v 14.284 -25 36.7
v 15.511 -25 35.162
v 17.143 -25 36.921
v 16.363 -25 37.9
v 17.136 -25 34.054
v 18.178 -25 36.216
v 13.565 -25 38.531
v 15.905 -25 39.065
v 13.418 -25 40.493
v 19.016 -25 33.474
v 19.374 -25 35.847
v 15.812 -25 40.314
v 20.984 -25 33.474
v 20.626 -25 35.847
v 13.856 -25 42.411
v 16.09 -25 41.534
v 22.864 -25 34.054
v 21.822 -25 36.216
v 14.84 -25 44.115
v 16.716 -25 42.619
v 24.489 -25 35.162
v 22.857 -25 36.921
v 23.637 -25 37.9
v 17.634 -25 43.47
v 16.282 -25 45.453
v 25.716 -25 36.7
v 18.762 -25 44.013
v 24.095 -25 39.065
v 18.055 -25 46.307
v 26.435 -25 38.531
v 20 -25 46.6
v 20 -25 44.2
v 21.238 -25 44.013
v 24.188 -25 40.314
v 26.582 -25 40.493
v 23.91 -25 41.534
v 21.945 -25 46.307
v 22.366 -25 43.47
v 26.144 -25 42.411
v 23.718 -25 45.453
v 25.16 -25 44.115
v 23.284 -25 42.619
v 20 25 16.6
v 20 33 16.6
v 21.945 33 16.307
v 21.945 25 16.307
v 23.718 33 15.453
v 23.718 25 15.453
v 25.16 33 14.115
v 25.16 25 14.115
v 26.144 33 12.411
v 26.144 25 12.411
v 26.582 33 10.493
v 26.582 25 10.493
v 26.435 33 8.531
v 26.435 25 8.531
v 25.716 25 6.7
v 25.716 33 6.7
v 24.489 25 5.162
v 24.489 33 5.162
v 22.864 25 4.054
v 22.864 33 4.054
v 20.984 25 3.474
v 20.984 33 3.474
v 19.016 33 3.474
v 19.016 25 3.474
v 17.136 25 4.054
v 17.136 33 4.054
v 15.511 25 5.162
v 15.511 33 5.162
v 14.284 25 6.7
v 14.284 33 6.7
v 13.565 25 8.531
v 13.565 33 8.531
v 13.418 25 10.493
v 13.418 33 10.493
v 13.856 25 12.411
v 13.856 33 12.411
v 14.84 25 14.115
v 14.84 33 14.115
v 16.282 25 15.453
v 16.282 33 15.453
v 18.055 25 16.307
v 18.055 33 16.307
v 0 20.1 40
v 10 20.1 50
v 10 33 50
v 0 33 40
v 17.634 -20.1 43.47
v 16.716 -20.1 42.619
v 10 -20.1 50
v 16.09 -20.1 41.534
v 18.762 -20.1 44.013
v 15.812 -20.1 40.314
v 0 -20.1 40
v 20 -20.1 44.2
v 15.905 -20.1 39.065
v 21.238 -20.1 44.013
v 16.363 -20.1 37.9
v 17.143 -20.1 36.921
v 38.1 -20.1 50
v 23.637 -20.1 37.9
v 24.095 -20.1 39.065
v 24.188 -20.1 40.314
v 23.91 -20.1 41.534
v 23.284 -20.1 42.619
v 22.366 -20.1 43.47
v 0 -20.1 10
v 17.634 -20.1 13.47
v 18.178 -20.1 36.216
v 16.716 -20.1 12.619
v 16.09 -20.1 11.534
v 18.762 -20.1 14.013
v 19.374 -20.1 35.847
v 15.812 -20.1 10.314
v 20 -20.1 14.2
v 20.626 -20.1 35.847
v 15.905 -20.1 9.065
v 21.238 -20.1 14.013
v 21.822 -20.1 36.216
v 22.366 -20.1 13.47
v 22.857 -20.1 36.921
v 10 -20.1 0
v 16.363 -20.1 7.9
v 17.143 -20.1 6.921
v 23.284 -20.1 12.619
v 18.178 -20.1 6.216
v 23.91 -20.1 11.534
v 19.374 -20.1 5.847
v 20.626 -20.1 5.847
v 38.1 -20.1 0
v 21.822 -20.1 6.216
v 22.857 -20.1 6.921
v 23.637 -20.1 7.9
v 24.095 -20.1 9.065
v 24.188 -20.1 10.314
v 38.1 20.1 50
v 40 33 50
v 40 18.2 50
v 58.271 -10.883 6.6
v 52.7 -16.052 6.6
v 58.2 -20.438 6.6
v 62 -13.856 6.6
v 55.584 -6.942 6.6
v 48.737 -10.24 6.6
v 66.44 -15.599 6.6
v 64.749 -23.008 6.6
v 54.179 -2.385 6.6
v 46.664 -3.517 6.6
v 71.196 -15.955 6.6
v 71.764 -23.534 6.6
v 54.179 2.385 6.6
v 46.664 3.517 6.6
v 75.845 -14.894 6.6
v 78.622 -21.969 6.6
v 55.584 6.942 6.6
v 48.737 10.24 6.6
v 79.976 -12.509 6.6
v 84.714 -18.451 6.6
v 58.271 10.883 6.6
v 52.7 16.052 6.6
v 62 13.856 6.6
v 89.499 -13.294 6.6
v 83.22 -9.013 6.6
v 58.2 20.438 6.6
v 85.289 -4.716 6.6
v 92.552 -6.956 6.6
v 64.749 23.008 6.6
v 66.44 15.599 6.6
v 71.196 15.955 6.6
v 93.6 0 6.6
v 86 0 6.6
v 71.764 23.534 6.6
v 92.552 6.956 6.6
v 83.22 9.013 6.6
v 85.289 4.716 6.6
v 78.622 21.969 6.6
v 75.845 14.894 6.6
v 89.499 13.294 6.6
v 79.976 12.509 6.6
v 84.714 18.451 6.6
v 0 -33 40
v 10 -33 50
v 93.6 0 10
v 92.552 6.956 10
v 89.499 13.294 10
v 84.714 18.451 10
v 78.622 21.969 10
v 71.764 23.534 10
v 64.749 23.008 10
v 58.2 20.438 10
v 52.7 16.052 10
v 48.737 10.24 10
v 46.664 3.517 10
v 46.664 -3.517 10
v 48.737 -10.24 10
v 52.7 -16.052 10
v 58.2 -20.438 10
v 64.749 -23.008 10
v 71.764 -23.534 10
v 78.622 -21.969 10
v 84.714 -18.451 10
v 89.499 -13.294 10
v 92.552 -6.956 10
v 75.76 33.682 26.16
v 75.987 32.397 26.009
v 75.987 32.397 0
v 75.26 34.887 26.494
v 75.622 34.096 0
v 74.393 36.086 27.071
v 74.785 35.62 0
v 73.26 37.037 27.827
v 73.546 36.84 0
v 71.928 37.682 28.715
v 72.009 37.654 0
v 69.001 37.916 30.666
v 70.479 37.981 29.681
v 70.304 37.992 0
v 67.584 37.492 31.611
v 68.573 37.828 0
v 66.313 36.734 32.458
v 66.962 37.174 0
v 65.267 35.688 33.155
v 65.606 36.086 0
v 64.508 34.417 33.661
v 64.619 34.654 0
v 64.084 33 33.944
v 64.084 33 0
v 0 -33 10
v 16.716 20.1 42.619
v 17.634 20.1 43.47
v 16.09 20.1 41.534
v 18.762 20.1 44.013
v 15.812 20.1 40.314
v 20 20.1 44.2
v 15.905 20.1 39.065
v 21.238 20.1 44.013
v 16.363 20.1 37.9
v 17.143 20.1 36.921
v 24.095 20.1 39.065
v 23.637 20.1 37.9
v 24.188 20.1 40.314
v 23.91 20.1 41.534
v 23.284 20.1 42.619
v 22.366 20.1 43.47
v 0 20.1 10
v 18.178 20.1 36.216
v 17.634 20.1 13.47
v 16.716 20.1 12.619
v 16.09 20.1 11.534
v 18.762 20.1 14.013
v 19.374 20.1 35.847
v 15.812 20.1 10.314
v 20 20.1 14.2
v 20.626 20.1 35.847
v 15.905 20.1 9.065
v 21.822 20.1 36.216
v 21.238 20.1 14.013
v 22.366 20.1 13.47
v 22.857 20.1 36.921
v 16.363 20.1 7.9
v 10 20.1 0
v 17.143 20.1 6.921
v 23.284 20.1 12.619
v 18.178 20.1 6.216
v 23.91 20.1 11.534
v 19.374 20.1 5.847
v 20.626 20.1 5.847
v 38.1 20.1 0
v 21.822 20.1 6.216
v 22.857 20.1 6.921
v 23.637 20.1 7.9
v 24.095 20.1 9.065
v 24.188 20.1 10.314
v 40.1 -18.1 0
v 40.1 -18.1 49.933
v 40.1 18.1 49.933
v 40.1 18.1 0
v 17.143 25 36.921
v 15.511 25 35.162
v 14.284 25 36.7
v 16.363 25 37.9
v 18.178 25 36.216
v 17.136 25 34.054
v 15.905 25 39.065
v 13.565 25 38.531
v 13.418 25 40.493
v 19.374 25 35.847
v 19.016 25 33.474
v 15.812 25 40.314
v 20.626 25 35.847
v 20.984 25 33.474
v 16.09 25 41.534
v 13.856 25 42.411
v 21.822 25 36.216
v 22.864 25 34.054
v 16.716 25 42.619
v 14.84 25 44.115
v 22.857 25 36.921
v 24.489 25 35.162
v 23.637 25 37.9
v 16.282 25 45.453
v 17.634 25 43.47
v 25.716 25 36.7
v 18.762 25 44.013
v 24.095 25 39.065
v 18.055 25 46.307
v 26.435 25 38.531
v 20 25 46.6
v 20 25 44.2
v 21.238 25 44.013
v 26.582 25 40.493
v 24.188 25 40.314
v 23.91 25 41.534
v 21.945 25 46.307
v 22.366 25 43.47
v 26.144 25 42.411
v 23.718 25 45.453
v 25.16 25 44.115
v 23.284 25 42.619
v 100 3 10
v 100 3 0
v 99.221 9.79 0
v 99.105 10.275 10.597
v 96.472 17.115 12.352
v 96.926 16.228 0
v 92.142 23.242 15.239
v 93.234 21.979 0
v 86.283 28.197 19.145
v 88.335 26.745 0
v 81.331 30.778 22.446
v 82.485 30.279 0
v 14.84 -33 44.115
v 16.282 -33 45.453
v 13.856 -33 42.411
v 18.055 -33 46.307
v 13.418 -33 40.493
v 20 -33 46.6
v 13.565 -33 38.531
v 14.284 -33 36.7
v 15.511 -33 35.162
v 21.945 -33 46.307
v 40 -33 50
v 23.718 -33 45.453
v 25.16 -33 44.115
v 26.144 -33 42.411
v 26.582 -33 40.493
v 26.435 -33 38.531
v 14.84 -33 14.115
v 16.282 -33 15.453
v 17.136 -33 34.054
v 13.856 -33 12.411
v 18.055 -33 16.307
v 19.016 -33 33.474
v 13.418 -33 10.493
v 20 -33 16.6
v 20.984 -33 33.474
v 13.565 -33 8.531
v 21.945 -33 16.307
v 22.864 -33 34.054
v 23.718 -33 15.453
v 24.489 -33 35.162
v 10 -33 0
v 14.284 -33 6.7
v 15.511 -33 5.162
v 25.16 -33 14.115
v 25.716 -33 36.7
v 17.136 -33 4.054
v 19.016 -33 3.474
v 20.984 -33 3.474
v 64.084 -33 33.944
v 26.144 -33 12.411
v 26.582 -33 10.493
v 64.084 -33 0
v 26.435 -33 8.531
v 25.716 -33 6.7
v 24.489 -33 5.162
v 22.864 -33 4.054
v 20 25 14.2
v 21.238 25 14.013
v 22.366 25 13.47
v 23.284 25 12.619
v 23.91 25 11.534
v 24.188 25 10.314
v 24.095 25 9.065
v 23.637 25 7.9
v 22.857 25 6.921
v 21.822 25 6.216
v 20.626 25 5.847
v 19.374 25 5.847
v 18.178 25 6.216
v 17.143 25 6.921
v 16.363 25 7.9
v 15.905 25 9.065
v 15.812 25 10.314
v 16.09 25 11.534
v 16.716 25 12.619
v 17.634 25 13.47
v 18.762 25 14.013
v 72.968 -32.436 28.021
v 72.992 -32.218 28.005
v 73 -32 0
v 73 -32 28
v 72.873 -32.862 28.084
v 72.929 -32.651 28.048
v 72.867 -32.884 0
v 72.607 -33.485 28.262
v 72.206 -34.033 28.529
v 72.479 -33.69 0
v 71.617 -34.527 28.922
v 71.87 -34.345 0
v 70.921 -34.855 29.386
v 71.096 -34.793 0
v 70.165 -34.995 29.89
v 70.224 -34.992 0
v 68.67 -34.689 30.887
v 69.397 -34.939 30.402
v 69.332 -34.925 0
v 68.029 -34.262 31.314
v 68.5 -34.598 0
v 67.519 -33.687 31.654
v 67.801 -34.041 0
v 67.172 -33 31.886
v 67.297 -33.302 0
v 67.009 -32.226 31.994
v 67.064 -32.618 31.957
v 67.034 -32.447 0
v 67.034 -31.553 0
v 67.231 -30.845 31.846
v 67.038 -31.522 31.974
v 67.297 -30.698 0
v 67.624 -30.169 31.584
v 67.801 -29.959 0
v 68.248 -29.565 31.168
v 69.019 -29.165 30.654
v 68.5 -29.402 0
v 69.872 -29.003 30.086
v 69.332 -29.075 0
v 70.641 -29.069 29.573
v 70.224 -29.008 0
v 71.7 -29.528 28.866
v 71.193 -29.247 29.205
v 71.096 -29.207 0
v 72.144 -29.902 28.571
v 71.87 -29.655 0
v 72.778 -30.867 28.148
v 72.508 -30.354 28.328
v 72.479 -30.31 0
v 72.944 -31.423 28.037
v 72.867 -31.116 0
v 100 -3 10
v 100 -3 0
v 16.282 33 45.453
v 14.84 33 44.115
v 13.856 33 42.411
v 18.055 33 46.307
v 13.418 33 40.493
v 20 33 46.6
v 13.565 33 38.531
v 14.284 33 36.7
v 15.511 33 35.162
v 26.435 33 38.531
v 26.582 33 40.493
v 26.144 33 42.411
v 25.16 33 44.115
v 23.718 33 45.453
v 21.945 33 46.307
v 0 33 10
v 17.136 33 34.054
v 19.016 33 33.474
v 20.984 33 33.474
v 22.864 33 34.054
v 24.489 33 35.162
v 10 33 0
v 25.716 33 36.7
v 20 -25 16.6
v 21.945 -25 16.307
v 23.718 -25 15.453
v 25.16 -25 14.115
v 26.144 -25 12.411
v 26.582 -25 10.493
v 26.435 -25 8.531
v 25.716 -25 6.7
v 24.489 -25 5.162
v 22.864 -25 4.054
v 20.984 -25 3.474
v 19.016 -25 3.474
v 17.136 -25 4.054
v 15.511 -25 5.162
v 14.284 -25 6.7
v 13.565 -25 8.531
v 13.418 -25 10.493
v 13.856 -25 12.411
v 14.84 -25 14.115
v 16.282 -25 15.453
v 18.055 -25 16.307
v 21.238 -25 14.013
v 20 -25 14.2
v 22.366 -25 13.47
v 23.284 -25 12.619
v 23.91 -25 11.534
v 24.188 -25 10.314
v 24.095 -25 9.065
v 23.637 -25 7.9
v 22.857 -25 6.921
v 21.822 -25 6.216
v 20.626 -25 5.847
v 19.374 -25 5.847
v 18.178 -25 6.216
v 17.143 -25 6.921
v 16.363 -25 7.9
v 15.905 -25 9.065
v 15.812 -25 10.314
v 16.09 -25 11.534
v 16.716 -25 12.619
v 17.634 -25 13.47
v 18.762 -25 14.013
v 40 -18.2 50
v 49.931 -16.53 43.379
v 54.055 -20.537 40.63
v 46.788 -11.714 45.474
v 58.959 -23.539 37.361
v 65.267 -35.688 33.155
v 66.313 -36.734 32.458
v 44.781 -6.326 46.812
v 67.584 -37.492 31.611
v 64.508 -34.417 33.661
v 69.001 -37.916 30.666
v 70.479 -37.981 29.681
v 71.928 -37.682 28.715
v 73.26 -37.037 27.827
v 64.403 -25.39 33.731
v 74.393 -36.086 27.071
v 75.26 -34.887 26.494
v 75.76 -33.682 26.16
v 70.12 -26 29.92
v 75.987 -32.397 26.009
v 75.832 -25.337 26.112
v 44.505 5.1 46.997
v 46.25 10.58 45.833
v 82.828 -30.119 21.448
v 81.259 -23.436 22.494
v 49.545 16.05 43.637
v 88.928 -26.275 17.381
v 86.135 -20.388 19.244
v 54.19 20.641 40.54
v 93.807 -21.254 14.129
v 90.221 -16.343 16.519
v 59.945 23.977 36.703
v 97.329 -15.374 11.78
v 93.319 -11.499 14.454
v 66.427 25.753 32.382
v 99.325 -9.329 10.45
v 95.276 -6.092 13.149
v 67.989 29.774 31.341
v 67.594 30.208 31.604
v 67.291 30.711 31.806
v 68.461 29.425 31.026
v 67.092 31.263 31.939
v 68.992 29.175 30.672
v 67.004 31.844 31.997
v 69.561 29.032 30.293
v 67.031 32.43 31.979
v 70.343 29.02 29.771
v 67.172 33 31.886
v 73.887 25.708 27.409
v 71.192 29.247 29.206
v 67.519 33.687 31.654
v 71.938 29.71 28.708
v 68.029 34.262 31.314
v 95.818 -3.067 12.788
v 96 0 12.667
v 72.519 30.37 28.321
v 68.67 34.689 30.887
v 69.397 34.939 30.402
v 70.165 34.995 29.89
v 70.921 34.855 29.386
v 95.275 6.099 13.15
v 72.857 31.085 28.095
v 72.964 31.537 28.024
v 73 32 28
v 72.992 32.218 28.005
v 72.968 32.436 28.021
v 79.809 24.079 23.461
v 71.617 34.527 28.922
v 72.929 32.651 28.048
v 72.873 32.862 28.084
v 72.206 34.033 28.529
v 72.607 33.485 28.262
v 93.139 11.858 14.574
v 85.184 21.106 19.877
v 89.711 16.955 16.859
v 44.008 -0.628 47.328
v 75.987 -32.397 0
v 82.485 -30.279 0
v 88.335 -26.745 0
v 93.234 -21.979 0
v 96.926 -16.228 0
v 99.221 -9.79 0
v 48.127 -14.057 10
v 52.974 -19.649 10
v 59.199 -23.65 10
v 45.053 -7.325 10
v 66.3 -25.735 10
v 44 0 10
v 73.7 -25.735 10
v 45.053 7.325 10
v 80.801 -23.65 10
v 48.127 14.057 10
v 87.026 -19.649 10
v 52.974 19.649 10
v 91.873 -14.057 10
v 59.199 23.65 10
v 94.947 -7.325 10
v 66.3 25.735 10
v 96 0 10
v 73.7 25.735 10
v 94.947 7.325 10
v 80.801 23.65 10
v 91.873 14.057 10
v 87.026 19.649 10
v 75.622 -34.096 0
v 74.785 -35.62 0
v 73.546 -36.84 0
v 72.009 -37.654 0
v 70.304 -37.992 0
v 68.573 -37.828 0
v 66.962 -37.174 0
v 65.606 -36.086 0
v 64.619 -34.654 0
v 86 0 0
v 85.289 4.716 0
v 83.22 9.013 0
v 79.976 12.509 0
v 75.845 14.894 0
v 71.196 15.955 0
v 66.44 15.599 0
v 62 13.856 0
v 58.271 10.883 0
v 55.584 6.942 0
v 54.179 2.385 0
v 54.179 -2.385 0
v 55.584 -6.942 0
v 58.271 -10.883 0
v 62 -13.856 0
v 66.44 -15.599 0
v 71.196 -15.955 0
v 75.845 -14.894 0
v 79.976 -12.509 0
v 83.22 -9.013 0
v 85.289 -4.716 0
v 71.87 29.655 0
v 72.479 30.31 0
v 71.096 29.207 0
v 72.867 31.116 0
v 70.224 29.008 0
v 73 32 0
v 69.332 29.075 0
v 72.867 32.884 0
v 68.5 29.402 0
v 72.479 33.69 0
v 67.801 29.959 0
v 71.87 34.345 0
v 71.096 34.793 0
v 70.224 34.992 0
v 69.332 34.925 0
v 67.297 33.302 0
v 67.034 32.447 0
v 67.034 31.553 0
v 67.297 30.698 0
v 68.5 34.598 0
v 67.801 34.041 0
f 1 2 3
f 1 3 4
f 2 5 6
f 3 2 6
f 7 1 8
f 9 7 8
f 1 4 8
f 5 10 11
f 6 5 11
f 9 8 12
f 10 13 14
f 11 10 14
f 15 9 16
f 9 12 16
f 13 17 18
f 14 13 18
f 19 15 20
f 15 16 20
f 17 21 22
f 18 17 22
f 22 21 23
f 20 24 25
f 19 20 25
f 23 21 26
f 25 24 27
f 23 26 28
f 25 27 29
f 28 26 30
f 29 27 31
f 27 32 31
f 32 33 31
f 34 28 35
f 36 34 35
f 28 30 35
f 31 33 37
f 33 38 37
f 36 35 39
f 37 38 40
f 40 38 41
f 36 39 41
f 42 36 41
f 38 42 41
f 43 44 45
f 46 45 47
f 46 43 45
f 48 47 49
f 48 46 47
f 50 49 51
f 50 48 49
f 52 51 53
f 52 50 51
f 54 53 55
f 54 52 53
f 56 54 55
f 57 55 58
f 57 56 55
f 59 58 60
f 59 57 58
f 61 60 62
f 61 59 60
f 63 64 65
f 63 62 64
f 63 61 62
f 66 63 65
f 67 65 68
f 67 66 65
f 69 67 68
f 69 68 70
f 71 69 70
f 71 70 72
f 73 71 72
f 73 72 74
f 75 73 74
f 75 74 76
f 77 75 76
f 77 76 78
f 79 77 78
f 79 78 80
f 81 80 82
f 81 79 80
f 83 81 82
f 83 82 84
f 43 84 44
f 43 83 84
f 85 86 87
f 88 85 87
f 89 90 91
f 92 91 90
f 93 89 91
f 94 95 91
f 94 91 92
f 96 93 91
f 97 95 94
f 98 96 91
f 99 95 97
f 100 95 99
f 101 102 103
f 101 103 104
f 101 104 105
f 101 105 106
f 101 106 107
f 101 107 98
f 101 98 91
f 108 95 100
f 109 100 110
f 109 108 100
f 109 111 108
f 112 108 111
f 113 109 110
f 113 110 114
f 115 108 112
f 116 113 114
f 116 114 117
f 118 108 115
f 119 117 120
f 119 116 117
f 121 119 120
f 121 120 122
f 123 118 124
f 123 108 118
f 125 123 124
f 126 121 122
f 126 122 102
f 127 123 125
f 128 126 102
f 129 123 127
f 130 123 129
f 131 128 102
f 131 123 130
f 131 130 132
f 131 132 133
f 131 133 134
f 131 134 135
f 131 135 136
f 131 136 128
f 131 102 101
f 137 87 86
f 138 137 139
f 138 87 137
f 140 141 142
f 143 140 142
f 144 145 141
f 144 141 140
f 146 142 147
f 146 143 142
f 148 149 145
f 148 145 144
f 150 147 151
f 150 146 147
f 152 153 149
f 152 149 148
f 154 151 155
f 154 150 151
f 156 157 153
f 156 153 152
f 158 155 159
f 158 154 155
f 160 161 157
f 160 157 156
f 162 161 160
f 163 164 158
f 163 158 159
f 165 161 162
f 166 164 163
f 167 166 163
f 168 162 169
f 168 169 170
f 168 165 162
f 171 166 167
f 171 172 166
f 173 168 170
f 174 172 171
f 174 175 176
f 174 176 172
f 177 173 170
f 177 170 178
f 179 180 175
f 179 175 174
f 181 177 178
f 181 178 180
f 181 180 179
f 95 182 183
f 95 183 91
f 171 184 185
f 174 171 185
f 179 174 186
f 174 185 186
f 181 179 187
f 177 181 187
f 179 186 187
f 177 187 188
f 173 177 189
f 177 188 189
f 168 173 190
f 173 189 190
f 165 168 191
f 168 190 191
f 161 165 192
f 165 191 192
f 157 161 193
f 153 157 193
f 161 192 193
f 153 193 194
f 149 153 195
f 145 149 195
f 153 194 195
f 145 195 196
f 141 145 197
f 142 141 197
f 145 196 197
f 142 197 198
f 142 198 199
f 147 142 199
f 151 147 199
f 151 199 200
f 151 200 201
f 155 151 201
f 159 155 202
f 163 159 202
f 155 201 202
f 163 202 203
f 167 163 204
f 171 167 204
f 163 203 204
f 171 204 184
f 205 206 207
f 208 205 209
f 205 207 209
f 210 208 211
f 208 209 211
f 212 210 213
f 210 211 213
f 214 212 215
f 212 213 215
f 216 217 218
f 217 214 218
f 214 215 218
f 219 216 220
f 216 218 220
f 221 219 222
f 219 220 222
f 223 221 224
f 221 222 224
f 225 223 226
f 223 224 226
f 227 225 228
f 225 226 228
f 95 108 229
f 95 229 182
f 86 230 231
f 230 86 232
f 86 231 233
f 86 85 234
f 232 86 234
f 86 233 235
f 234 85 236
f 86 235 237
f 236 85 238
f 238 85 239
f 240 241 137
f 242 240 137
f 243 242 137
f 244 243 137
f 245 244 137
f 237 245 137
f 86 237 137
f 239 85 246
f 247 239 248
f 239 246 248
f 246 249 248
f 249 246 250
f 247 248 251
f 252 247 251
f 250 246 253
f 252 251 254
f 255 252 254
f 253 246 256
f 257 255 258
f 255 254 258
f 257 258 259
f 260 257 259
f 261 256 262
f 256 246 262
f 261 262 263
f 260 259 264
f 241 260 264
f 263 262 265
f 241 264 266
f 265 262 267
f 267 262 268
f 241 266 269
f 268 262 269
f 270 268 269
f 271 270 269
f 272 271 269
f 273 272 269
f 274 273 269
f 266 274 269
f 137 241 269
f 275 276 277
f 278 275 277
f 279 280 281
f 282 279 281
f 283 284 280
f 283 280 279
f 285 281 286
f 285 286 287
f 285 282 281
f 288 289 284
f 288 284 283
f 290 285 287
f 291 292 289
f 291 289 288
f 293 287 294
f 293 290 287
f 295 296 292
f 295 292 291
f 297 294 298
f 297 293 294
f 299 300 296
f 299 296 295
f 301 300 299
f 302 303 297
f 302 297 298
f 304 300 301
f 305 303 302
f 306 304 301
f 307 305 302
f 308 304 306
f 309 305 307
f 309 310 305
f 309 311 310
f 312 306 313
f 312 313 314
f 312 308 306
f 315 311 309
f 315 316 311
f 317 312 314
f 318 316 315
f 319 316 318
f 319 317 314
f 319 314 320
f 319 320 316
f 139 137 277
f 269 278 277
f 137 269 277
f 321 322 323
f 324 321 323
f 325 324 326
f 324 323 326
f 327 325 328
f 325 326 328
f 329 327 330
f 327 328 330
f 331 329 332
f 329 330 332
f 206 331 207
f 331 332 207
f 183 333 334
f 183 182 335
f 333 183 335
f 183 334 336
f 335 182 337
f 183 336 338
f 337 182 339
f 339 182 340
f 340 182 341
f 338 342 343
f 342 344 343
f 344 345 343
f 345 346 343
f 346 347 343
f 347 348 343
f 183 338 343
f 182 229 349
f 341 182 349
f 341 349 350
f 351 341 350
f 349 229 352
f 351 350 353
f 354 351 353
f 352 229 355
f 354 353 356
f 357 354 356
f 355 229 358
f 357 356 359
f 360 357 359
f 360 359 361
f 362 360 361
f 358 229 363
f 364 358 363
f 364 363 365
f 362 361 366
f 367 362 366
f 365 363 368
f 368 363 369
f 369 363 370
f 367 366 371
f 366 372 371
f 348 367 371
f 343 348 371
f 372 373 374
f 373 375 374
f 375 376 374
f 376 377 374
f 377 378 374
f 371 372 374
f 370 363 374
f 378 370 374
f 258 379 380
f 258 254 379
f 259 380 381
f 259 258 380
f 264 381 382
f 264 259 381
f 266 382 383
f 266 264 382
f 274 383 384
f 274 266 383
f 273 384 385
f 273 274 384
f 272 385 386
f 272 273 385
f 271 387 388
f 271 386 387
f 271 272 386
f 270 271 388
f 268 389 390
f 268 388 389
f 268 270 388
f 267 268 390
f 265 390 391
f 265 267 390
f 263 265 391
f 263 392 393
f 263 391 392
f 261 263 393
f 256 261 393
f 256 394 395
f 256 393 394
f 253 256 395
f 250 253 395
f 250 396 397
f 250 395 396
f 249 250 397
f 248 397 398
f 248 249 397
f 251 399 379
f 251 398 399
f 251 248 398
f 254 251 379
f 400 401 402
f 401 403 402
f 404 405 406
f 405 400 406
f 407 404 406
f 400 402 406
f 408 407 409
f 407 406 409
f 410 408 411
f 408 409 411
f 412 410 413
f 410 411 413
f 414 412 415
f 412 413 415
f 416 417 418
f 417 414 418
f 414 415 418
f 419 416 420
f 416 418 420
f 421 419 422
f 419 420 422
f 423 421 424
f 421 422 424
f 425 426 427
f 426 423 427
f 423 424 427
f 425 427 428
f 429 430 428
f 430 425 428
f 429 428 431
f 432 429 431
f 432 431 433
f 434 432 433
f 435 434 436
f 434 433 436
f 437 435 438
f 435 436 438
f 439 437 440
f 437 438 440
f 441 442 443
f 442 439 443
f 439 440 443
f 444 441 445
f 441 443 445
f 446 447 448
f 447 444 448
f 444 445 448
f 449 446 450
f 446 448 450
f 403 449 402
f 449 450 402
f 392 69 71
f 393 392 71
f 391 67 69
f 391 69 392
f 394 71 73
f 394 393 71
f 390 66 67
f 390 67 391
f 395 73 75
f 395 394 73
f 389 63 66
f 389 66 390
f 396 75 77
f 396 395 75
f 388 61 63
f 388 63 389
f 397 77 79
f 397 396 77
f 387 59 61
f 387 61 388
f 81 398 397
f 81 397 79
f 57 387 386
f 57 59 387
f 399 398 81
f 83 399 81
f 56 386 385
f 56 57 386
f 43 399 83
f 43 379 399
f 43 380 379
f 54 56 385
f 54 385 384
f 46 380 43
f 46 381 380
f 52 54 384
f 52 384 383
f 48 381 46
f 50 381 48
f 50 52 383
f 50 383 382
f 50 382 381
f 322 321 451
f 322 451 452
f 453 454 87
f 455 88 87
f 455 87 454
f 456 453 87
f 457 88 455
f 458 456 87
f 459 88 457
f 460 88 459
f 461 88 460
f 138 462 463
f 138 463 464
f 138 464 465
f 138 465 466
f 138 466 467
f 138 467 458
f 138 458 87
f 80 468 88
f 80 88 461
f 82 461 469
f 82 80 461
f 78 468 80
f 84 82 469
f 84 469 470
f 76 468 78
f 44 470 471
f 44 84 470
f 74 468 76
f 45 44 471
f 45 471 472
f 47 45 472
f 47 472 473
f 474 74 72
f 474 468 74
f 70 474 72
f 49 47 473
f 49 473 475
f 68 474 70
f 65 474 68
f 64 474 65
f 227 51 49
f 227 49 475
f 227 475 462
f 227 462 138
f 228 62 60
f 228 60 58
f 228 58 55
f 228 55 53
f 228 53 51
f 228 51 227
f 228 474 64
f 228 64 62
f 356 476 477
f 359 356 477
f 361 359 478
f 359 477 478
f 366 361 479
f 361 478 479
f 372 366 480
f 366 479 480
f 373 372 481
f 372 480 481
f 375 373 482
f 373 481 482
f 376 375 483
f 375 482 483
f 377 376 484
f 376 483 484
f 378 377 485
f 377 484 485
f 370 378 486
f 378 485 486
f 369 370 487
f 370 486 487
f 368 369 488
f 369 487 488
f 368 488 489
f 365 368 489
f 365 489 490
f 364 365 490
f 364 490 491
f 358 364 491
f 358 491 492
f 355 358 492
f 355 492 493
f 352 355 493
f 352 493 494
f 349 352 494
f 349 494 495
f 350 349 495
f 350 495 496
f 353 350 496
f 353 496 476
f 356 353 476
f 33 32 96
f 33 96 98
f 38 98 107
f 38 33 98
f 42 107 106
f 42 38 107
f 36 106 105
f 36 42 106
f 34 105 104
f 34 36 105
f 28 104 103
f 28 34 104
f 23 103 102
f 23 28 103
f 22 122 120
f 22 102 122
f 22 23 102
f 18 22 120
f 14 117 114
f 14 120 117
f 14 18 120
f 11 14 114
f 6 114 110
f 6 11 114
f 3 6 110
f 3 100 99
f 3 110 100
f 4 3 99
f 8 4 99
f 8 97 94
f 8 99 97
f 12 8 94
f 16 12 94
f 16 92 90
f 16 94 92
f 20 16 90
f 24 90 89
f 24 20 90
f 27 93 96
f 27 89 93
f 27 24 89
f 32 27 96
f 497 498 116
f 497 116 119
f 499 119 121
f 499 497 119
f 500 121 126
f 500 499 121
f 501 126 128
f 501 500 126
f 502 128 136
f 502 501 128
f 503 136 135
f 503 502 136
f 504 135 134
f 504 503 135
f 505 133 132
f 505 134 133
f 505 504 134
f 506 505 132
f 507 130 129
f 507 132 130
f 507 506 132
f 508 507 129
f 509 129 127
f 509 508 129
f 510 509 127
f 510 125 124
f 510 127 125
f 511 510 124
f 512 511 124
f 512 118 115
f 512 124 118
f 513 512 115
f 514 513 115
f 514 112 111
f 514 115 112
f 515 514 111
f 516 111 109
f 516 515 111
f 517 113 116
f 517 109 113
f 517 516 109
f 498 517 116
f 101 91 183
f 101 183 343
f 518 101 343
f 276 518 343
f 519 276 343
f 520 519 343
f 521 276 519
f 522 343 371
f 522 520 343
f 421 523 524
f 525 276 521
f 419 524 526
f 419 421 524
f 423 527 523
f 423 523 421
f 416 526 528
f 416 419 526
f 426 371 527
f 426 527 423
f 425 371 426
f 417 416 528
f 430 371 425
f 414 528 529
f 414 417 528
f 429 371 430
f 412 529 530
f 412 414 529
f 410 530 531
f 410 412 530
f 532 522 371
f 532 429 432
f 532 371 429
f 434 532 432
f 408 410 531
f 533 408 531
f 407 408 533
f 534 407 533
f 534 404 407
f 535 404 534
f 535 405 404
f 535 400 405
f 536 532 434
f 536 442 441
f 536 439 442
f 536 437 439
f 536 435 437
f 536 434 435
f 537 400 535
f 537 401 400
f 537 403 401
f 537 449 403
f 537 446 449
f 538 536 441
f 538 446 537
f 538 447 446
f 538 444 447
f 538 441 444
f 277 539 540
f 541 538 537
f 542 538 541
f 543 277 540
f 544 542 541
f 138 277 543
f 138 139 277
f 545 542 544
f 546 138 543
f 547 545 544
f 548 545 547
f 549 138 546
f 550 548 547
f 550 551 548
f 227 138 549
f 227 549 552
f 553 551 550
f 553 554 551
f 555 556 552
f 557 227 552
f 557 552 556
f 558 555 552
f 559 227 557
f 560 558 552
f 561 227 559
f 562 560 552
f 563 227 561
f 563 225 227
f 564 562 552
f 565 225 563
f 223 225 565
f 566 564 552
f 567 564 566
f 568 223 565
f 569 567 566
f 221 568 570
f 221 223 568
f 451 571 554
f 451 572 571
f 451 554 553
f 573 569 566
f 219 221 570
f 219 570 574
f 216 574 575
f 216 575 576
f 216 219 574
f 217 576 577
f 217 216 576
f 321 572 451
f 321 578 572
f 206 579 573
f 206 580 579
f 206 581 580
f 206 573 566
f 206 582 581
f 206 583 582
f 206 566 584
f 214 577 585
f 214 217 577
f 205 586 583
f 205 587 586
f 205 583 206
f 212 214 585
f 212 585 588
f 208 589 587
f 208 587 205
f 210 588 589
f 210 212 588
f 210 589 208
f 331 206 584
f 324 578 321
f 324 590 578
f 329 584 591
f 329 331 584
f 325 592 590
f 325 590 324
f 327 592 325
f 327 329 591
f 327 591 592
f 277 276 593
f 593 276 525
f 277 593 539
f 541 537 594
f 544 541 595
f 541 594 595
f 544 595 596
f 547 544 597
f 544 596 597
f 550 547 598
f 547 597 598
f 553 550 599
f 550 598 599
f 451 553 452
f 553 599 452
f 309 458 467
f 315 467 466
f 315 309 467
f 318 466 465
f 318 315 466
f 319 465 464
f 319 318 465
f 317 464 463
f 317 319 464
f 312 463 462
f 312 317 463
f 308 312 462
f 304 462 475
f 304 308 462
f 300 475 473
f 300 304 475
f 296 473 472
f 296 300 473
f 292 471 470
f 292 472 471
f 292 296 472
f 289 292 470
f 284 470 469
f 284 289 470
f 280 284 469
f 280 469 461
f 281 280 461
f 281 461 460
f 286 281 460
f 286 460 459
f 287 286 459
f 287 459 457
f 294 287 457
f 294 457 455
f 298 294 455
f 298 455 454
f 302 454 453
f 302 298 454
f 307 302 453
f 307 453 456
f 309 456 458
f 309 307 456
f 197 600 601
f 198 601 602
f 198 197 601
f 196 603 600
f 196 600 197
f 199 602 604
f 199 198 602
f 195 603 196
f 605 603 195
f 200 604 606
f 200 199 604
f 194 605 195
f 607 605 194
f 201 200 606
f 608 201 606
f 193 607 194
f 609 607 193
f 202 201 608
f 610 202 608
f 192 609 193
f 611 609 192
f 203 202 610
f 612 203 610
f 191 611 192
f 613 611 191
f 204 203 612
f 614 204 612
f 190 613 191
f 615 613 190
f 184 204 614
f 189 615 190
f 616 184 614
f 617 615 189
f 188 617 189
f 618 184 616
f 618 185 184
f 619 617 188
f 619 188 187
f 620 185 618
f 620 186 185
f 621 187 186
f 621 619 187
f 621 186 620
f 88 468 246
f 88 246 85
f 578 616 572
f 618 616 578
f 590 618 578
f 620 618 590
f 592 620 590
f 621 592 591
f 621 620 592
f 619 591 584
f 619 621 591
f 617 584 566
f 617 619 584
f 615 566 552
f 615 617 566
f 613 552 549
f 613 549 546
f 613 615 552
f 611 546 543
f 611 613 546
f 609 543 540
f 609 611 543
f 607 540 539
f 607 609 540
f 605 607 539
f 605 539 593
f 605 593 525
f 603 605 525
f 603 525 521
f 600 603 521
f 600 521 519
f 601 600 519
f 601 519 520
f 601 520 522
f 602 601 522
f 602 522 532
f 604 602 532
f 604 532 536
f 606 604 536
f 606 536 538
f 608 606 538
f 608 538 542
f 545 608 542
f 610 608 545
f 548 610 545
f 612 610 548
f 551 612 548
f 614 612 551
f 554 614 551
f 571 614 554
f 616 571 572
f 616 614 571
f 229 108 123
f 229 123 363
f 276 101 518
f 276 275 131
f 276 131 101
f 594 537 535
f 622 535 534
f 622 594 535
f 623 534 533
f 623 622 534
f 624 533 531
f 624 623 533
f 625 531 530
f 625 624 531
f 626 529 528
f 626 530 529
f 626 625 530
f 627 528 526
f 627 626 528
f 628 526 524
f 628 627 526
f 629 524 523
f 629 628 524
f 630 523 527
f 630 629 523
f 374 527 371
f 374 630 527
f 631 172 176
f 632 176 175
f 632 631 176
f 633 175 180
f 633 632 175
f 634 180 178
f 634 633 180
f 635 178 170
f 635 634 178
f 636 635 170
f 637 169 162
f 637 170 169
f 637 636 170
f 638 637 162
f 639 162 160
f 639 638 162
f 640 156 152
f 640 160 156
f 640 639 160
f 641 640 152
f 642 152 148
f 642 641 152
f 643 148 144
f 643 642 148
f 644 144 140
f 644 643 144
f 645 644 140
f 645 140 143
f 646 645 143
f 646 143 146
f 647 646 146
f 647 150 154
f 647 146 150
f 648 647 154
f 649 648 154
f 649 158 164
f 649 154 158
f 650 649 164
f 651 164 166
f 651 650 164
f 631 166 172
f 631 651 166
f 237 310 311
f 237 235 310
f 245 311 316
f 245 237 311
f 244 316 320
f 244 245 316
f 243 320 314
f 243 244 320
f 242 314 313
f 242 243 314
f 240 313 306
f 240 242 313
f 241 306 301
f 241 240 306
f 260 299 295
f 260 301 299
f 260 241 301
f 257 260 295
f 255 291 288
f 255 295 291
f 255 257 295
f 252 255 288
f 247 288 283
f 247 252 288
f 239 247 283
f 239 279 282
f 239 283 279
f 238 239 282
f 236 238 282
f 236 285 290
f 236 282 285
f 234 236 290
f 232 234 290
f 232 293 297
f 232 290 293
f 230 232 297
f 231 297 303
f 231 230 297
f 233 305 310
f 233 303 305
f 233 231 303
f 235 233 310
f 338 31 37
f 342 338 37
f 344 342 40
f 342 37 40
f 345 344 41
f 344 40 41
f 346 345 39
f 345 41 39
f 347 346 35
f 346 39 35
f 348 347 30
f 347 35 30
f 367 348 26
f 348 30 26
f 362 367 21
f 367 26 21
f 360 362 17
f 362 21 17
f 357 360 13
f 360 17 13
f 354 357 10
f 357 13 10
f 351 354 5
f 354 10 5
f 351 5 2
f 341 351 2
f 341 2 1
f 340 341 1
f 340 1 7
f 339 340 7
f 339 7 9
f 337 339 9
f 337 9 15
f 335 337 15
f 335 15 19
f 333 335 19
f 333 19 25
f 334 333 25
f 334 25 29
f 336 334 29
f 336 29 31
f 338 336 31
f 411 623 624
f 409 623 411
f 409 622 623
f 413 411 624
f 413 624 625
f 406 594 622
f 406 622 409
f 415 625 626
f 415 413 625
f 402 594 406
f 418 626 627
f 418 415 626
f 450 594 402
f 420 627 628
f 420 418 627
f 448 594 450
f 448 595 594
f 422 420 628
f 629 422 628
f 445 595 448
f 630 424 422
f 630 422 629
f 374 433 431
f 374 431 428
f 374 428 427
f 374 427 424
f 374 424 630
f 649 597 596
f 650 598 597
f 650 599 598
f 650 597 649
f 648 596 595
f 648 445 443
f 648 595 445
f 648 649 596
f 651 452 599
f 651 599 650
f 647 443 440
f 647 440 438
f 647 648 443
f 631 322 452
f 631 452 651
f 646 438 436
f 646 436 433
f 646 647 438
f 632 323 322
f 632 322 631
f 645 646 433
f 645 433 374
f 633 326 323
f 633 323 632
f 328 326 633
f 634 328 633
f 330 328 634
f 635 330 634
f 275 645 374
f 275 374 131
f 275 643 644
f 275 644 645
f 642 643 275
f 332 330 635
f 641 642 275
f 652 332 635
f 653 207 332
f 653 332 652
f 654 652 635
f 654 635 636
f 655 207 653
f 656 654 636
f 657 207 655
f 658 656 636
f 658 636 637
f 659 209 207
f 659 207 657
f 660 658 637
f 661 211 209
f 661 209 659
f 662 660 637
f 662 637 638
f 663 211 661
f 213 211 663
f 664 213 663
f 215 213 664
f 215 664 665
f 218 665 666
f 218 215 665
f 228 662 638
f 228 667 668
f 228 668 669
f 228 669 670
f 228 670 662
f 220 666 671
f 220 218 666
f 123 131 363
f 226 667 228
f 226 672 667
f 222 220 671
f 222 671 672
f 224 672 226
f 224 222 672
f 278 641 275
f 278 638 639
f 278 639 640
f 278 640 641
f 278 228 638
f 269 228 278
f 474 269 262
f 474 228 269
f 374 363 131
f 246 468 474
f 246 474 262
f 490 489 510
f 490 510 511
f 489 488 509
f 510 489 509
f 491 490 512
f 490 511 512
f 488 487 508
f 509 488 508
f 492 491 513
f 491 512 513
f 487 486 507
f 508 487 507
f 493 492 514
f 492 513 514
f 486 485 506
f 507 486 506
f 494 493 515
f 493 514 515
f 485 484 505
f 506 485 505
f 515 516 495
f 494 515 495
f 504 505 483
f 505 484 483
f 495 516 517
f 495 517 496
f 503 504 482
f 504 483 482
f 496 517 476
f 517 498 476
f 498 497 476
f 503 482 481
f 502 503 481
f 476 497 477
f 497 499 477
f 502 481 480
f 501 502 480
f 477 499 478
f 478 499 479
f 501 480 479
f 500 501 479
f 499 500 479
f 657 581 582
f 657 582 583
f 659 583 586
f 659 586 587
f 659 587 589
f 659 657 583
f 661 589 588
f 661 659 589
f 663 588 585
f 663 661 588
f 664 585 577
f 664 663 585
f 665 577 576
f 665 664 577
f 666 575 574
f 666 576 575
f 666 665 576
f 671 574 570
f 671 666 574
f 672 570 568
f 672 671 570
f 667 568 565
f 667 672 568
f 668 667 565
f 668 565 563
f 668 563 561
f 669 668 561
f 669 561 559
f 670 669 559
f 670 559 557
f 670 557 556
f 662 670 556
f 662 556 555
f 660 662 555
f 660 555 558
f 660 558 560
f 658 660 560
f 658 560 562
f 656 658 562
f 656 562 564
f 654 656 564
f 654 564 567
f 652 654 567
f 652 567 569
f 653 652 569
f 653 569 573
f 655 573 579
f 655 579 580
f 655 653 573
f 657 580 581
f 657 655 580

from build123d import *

# Parameters (mm, degrees)
SKETCH1_R           = 4.2
BOSS_EXTRUDE1_DEPTH = 33
SKETCH2_R           = 16
SKETCH2_W           = 40.2
SKETCH2_H           = 40.2
CUT_EXTRUDE1_DEPTH  = 117.571866246
CUT_EXTRUDE2_START  = 10
SKETCH3_R           = 26
CUT_EXTRUDE2_DEPTH  = 107.571866246
SKETCH4_R           = 23.6
CUT_EXTRUDE3_DEPTH  = 3.4
FILLET1_R           = 30
CHAMFER1_SIZE       = 2
CUT_EXTRUDE5_START  = -25
SKETCH5_R           = 6.6
CUT_EXTRUDE5_DEPTH  = 92.571866246
CHAMFER2_SIZE       = 10
BOSS_EXTRUDE2_REACH = 118.572
SKETCH6_R           = 3
SKETCH6_2_R         = 3
CUT_EXTRUDE6_DEPTH  = 119.084715353


with BuildPart() as part:
    # Sketch1 → Boss-Extrude1 (new, symmetric)
    with BuildSketch(Plane(origin=(0, 0, 0), x_dir=(1, 0, 0), z_dir=(0, 1, 0))):
        Polygon((0, 0), (0, -50), (40, -50), (100, -10), (100, 0), align=None)
        with Locations(Location((20, -10, 0), (0, 0, 270))):
            Circle(SKETCH1_R, mode=Mode.SUBTRACT)
        with Locations(Location((20, -40, 0), (0, 0, 270))):
            Circle(SKETCH1_R, mode=Mode.SUBTRACT)
    extrude(amount=BOSS_EXTRUDE1_DEPTH, both=True)

    # Sketch2 → Cut-Extrude1 (cut, through all)
    with BuildSketch(Plane.XY):
        with Locations((70, 0)):
            Circle(SKETCH2_R)
        with Locations((20, 0)):
            Rectangle(SKETCH2_W, SKETCH2_H)
    extrude(amount=CUT_EXTRUDE1_DEPTH, mode=Mode.SUBTRACT)

    # Sketch3 → Cut-Extrude2 (cut, through all)
    with BuildSketch(Plane.XY.offset(CUT_EXTRUDE2_START)):
        with Locations((70, 0)):
            Circle(SKETCH3_R)
    extrude(amount=CUT_EXTRUDE2_DEPTH, mode=Mode.SUBTRACT)

    # Sketch4 → Cut-Extrude3 (cut)
    with BuildSketch(Plane.XY.offset(10)):
        with Locations((70, 0)):
            Circle(SKETCH4_R)
    extrude(amount=-CUT_EXTRUDE3_DEPTH, mode=Mode.SUBTRACT)

    # Fillet1
    fillet1_edges = [part.edges().sort_by_distance(p)[0] for p in [
        (100, 33, 5),
        (100, -33, 5),
    ]]
    fillet(fillet1_edges, radius=FILLET1_R)

    # Chamfer1
    chamfer1_edges = [part.edges().sort_by_distance(p)[0] for p in [
        (40.1, -20.1, 24.966666667),
        (40.1, 20.1, 24.966666667),
    ]]
    chamfer(chamfer1_edges, length=CHAMFER1_SIZE)

    # Sketch5 → Cut-Extrude5 (cut, through all)
    with BuildSketch(Plane(origin=(0, 0, 0), x_dir=(1, 0, 0), z_dir=(0, 1, 0)).offset(CUT_EXTRUDE5_START)):
        with Locations(Location((20, -40, 0), (0, 0, 270))):
            Circle(SKETCH5_R)
        with Locations(Location((20, -10, 0), (0, 0, 270))):
            Circle(SKETCH5_R)
    cut_extrude5 = extrude(amount=-CUT_EXTRUDE5_DEPTH, mode=Mode.SUBTRACT)

    # Mirror1: Cut-Extrude5 across plane
    add(cut_extrude5.mirror(Plane.ZX), mode=Mode.SUBTRACT)

    # Chamfer2
    chamfer2_edges = [part.edges().sort_by_distance(p)[0] for p in [
        (0, -26.55, 50),
        (0, -26.55, 0),
        (0, 26.55, 50),
        (0, 26.55, 0),
    ]]
    chamfer(chamfer2_edges, length=CHAMFER2_SIZE)

    # Boss-Extrude2: up to this plane
    boss_extrude2_end = Plane(origin=(40, 33, 50), z_dir=(-0.5547001962252289, 0, -0.8320502943378438))
    # Sketch6 → Boss-Extrude2 (add, up to the surface)
    with BuildSketch(Plane.XY, mode=Mode.PRIVATE) as boss_extrude2_sk1:
        with BuildLine():
            Line((66.68337521, 27), (73.31662479, 27))
            ThreePointArc((73.31662479, 27), (70, 38), (66.68337521, 27))
        make_face()
        with Locations((70, 32)):
            Circle(SKETCH6_R, mode=Mode.SUBTRACT)
    boss_extrude2_tool1 = split(extrude(boss_extrude2_sk1.sketch, amount=BOSS_EXTRUDE2_REACH, mode=Mode.PRIVATE), bisect_by=boss_extrude2_end, keep=Keep.BOTH, mode=Mode.PRIVATE)
    boss_extrude2 = boss_extrude2_tool1.solids().sort_by_distance((70, 27.162788, 0))[0]
    add(boss_extrude2)

    # Sketch6<2> → Cut-Extrude6 (cut, through all)
    with BuildSketch(Plane.XY):
        with Locations((70, 32)):
            Circle(SKETCH6_2_R)
    cut_extrude6 = extrude(amount=CUT_EXTRUDE6_DEPTH, mode=Mode.SUBTRACT)

    # Mirror2: Boss-Extrude2, Cut-Extrude6 across plane
    add(boss_extrude2.mirror(Plane.ZX))
    add(cut_extrude6.mirror(Plane.ZX), mode=Mode.SUBTRACT)


solid = part.part
